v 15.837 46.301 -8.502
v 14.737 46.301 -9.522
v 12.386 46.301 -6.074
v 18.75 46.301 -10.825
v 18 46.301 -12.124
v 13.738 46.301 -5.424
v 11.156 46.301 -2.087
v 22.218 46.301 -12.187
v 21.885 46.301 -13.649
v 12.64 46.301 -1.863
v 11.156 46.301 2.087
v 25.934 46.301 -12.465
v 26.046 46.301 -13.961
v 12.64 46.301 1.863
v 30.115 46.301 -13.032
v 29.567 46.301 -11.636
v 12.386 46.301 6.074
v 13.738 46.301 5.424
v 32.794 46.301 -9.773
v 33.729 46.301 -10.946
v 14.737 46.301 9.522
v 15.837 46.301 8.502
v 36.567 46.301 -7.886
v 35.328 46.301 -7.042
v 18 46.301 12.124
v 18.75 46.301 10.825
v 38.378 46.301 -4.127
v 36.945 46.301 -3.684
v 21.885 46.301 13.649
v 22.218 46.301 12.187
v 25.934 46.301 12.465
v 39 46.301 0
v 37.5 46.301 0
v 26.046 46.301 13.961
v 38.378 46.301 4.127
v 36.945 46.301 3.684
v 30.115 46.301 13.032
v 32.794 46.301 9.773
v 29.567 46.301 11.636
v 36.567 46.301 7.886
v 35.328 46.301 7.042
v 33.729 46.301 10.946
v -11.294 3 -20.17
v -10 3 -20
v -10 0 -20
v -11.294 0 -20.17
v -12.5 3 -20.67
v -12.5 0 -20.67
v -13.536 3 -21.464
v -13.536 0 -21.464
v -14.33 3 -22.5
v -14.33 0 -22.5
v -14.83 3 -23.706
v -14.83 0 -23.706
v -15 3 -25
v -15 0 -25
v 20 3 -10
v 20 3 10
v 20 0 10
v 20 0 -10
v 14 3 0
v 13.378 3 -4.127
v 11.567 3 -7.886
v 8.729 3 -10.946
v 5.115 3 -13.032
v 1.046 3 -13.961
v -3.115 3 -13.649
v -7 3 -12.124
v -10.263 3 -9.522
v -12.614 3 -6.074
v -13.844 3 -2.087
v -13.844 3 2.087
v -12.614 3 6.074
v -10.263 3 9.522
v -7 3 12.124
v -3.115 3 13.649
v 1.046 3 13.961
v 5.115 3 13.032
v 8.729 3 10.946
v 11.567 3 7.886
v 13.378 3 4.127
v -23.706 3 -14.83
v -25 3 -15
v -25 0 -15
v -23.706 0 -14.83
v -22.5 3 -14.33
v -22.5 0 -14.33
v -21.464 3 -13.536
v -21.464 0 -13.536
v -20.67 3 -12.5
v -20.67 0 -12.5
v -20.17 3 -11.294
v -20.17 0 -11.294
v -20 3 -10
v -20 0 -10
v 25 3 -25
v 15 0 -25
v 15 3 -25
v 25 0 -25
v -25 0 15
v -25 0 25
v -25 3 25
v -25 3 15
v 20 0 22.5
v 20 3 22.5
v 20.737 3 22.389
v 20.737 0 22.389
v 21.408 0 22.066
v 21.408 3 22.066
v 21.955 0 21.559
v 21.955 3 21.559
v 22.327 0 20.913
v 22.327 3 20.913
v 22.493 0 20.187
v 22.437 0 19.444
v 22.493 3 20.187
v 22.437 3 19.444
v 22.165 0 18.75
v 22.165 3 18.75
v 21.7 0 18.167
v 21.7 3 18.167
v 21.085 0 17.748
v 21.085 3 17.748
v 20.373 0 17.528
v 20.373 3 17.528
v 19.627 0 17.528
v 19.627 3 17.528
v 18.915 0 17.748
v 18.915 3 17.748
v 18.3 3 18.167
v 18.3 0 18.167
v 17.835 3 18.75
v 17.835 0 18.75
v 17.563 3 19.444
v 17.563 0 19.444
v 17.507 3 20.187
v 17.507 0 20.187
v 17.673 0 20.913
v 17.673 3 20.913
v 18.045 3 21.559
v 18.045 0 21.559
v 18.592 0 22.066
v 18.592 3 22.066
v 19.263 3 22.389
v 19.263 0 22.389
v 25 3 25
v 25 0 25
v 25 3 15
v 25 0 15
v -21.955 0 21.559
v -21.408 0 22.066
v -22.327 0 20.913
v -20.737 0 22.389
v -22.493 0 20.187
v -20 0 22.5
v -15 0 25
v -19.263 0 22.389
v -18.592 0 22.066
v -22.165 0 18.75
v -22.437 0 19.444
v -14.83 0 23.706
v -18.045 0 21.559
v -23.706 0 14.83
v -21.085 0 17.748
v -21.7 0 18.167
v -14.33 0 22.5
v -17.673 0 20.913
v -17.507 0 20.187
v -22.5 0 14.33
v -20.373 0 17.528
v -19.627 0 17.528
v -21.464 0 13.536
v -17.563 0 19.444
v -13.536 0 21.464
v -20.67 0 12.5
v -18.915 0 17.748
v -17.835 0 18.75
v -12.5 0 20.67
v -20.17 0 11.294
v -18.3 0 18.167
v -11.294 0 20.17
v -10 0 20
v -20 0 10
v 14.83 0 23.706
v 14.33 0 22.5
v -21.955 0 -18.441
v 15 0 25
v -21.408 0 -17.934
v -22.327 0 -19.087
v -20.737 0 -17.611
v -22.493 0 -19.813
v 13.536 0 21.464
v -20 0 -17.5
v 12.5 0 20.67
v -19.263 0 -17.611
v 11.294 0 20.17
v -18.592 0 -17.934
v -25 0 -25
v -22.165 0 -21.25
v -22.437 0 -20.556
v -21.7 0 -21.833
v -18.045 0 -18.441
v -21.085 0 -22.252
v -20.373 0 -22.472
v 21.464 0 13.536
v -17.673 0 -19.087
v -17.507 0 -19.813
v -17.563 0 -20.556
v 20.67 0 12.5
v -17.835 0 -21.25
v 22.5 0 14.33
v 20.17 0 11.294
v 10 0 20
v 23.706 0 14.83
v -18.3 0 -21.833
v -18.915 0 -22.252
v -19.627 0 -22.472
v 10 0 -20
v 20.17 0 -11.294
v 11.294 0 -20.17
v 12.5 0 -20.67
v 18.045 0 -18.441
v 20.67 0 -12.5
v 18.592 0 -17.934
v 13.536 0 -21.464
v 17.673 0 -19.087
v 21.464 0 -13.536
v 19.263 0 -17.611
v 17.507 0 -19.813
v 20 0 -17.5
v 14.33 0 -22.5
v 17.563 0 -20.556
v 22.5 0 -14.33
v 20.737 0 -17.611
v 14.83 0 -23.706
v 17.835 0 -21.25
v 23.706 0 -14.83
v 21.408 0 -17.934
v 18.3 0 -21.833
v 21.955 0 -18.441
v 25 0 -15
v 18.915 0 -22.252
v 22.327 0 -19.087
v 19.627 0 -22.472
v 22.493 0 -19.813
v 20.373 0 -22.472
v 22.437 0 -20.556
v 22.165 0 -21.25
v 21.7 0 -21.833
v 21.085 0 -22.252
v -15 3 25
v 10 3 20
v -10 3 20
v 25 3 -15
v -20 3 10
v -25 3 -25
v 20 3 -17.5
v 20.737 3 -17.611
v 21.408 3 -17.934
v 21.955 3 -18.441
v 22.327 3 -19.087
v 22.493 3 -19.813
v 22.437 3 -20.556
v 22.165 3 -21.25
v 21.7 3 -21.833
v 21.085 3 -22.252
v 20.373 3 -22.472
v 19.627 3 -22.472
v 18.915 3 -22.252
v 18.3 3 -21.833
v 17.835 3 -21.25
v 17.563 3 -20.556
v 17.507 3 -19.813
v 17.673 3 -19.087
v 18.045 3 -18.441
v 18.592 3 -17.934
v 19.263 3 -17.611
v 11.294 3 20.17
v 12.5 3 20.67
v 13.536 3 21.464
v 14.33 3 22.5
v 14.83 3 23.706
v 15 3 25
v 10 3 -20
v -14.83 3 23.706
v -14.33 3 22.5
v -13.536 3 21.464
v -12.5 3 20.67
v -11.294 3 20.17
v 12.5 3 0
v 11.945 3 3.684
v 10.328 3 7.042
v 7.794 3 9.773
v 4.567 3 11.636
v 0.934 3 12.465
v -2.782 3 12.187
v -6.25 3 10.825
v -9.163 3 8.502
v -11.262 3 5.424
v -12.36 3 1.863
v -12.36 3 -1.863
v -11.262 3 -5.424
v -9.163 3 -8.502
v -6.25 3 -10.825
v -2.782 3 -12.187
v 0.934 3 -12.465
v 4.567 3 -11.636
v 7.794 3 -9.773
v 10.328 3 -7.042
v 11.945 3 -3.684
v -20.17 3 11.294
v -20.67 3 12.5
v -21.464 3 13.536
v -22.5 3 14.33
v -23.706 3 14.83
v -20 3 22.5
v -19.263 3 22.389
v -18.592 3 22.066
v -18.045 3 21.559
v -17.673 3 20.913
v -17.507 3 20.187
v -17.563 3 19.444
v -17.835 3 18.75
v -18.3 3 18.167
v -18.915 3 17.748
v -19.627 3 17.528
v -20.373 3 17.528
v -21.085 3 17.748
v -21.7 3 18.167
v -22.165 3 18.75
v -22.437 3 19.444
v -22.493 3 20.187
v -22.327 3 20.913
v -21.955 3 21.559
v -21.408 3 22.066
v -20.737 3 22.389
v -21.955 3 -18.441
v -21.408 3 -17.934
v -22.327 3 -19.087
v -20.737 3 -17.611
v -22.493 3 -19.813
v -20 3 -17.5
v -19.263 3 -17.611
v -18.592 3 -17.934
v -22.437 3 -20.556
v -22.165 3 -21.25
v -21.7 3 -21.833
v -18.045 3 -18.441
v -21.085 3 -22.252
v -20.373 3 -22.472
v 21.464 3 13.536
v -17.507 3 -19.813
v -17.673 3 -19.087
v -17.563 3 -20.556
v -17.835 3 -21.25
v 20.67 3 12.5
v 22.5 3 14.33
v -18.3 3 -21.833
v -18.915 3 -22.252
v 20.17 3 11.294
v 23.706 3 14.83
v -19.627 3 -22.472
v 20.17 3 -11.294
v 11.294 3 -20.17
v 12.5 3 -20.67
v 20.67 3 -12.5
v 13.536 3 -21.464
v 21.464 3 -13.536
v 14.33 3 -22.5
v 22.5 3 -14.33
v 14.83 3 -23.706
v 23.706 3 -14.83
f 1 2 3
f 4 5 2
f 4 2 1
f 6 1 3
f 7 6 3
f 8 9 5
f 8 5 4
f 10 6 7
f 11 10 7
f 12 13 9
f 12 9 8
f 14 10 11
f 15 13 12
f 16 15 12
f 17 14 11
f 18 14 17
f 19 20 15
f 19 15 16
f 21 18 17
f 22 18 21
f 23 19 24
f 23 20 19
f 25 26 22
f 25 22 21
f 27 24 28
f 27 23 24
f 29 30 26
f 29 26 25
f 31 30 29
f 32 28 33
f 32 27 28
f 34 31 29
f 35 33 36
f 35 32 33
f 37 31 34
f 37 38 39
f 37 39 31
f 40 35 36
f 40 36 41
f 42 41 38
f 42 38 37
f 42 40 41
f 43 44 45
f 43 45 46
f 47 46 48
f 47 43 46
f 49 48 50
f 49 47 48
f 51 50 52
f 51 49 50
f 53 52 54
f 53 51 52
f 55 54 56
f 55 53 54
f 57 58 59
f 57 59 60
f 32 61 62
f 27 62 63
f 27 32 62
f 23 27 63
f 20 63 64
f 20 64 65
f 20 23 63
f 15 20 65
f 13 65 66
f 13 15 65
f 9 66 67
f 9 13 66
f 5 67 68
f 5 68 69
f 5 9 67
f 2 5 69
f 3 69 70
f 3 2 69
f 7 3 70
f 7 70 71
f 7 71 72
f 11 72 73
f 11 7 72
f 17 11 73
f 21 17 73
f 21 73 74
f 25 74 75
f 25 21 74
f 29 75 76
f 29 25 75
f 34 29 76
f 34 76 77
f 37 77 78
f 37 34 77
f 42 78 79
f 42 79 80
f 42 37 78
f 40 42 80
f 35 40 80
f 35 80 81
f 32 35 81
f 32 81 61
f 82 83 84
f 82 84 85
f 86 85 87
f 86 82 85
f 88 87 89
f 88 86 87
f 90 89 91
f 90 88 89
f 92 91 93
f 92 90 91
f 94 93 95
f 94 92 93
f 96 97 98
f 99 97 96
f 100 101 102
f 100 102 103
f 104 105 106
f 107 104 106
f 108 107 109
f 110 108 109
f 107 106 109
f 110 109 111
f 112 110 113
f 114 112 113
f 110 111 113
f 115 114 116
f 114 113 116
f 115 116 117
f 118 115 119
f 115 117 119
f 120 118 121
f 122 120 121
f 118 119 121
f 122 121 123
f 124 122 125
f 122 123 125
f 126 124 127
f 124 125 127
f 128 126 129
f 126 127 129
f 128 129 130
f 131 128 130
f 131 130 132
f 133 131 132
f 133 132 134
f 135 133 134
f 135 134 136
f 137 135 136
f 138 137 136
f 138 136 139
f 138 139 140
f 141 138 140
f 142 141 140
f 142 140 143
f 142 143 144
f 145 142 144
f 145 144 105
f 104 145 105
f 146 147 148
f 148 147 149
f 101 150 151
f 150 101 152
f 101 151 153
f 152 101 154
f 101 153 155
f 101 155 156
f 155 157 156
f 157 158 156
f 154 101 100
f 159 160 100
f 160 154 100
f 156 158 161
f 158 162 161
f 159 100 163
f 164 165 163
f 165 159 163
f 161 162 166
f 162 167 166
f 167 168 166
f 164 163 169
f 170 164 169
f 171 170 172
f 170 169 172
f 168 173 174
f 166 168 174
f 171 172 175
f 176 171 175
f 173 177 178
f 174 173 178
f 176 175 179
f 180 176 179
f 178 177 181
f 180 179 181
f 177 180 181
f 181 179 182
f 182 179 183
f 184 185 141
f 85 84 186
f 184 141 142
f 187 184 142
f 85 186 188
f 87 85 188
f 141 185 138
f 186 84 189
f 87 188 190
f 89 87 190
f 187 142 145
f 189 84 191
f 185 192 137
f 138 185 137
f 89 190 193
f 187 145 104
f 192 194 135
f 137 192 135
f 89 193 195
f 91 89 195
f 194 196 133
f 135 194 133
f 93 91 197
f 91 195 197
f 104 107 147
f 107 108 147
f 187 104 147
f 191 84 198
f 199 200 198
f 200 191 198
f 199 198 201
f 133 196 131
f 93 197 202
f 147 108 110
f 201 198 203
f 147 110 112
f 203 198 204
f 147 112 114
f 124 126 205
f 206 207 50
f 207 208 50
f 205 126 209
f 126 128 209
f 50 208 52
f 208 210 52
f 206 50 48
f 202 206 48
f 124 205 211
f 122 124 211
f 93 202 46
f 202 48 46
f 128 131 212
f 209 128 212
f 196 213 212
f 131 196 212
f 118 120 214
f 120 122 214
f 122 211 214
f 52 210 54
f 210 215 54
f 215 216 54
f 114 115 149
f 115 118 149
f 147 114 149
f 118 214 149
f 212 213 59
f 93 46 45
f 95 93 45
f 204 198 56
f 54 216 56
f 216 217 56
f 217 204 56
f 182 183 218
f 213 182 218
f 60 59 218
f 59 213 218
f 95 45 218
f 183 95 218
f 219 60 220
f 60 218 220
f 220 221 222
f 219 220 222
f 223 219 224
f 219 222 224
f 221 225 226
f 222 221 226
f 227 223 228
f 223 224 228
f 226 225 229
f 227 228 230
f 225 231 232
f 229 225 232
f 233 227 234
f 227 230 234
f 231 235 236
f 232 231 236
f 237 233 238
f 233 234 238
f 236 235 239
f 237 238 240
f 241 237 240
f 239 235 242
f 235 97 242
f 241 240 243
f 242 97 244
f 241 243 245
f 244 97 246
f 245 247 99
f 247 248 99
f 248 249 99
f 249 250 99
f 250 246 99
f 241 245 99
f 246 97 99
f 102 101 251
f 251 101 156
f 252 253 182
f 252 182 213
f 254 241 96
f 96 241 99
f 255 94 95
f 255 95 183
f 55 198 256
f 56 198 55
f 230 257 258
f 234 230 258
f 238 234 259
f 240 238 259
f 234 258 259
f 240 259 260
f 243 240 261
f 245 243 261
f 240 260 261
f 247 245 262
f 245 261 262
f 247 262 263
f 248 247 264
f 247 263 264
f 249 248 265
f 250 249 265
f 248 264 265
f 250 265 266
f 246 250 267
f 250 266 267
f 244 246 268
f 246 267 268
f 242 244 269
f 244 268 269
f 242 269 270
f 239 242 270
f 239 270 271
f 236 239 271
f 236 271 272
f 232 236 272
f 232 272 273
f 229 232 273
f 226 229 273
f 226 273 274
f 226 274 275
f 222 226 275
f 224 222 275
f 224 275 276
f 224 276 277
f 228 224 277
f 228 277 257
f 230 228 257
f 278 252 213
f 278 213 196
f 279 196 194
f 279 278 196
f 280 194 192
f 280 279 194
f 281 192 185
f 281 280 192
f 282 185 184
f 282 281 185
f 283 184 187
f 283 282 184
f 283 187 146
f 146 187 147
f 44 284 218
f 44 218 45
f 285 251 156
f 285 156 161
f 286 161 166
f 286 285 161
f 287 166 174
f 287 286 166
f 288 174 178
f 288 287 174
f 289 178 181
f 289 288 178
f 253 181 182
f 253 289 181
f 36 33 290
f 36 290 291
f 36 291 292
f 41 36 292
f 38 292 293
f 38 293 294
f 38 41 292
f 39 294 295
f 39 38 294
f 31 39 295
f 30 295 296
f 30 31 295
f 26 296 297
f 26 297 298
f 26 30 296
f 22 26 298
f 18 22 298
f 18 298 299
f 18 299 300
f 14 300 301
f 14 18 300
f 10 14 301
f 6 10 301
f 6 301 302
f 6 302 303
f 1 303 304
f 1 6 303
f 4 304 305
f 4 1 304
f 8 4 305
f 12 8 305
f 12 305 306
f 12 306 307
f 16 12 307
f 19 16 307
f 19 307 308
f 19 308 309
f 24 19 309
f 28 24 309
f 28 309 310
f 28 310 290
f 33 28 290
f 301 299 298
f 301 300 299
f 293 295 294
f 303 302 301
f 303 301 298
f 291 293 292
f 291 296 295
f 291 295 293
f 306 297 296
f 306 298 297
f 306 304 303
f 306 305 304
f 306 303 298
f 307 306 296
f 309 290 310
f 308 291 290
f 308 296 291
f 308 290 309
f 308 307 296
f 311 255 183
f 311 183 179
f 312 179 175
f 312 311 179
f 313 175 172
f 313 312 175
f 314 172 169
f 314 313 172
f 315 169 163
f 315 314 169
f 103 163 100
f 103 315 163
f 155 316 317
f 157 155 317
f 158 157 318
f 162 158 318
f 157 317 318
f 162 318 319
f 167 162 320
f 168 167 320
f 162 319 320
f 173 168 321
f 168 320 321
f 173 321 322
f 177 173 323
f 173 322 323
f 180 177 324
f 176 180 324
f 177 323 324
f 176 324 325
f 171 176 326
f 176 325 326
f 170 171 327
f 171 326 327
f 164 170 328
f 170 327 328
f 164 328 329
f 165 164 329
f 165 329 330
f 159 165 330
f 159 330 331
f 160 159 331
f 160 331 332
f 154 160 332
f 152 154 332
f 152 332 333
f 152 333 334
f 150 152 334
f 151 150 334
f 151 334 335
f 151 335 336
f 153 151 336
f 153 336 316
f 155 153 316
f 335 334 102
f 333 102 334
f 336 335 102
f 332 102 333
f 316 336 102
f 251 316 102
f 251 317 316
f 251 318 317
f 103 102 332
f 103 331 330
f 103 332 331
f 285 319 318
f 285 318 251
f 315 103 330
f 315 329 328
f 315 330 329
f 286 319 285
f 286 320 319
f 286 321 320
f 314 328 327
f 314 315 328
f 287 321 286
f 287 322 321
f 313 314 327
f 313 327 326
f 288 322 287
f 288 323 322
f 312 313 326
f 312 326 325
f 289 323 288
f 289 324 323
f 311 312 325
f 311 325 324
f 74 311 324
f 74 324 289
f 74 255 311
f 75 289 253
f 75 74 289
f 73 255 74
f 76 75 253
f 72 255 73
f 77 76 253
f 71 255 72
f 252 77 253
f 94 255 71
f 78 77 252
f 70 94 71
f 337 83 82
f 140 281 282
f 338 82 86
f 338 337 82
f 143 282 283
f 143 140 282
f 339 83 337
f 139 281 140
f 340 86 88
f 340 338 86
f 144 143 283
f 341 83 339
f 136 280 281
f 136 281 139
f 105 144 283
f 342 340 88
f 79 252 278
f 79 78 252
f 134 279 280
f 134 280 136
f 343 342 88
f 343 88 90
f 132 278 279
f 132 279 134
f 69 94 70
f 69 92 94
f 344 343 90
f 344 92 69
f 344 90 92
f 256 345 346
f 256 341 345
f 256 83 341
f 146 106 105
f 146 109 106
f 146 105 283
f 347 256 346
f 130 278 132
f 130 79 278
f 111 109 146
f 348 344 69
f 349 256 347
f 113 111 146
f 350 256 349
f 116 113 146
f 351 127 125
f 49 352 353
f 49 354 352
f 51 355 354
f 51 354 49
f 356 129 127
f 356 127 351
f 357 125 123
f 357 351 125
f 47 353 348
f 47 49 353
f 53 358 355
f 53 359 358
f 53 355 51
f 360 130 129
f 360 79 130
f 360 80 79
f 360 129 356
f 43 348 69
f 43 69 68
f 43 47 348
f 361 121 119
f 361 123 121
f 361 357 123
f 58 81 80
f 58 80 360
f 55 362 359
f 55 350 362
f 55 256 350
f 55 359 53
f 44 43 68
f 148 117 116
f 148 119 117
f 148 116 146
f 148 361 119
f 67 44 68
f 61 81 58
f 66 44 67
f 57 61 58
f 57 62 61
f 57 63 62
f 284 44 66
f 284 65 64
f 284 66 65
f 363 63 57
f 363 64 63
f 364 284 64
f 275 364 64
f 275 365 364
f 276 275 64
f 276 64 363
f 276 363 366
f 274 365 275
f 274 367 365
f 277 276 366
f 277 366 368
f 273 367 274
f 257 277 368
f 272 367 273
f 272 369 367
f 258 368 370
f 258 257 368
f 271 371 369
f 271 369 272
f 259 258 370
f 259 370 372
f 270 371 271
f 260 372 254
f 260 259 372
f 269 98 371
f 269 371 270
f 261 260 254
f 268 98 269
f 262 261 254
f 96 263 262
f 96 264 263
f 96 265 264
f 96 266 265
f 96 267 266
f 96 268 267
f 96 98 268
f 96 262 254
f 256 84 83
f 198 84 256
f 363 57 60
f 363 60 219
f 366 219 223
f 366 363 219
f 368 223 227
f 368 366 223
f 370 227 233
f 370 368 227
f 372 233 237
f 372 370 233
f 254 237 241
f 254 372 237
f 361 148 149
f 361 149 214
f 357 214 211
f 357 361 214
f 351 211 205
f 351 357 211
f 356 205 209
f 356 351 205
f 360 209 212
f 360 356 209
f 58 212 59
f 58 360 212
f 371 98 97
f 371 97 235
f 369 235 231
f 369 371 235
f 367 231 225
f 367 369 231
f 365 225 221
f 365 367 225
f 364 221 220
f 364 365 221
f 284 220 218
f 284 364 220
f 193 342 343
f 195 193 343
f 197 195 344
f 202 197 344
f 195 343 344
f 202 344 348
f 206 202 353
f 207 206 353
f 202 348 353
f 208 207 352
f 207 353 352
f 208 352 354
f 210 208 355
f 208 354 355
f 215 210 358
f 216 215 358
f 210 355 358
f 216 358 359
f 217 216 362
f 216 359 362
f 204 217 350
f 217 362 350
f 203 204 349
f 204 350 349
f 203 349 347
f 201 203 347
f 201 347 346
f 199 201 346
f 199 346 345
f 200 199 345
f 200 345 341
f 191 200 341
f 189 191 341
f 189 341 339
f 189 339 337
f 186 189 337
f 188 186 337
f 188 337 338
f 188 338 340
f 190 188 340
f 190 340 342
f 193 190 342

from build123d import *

# Parameters (mm, degrees)
SKETCH1_W           = 50
SKETCH1_H           = 50
BOSS_EXTRUDE1_DEPTH = 3
SKETCH3_R           = 14
SKETCH3_R_2         = 12.5
CUT_EXTRUDE1_REACH  = 65.411
SKETCH4_R           = 2.5
CUT_EXTRUDE2_REACH  = 65.411
CIRPATTERN1_COUNT   = 4


with BuildPart() as part:
    # Sketch1 → Boss-Extrude1 (new body)
    with BuildSketch(Plane(origin=(0, 0, 0), x_dir=(1, 0, 0), z_dir=(0, 1, 0))):
        Rectangle(SKETCH1_W, SKETCH1_H)
    extrude(amount=BOSS_EXTRUDE1_DEPTH)

    # Sweep1: sweep along a path in Sketch2
    with BuildLine(Plane.XY) as sweep1_path:
        Line((0, 3), (25, 46.301270189))
    # Sketch3 → Sweep1 (sweep)
    with BuildSketch(Plane(origin=(0, 3, 0), x_dir=(1, 0, 0), z_dir=(0, 1, 0))):
        Circle(SKETCH3_R)
        Circle(SKETCH3_R_2, mode=Mode.SUBTRACT)
    sweep(path=sweep1_path.line)

    # Sketch4 → Cut-Extrude1 (cut, up to next)
    with BuildSketch(Plane(origin=(0, 3, 0), x_dir=(1, 0, 0), z_dir=(0, 1, 0)), mode=Mode.PRIVATE) as cut_extrude1_sk1:
        with Locations((-20, 20)):
            Circle(SKETCH4_R)
    cut_extrude1_tool1 = extrude(cut_extrude1_sk1.sketch, amount=-CUT_EXTRUDE1_REACH, mode=Mode.PRIVATE) & part.part
    # Sketch4 → Cut-Extrude1 (cut, up to next)
    with BuildSketch(Plane(origin=(0, 3, 0), x_dir=(1, 0, 0), z_dir=(0, 1, 0)), mode=Mode.PRIVATE) as cut_extrude1_sk2:
        with Locations((20, 20)):
            Circle(SKETCH4_R)
    cut_extrude1_tool2 = extrude(cut_extrude1_sk2.sketch, amount=-CUT_EXTRUDE1_REACH, mode=Mode.PRIVATE) & part.part
    # Sketch4 → Cut-Extrude1 (cut, up to next)
    with BuildSketch(Plane(origin=(0, 3, 0), x_dir=(1, 0, 0), z_dir=(0, 1, 0)), mode=Mode.PRIVATE) as cut_extrude1_sk3:
        with Locations((20, -20)):
            Circle(SKETCH4_R)
    cut_extrude1_tool3 = extrude(cut_extrude1_sk3.sketch, amount=-CUT_EXTRUDE1_REACH, mode=Mode.PRIVATE) & part.part
    # Sketch4 → Cut-Extrude1 (cut, up to next)
    with BuildSketch(Plane(origin=(0, 3, 0), x_dir=(1, 0, 0), z_dir=(0, 1, 0)), mode=Mode.PRIVATE) as cut_extrude1_sk4:
        with Locations((-20, -20)):
            Circle(SKETCH4_R)
    cut_extrude1_tool4 = extrude(cut_extrude1_sk4.sketch, amount=-CUT_EXTRUDE1_REACH, mode=Mode.PRIVATE) & part.part
    add(cut_extrude1_tool1.solids().sort_by_distance((-20, 3, -20))[0], mode=Mode.SUBTRACT)
    add(cut_extrude1_tool2.solids().sort_by_distance((20, 3, -20))[0], mode=Mode.SUBTRACT)
    add(cut_extrude1_tool3.solids().sort_by_distance((20, 3, 20))[0], mode=Mode.SUBTRACT)
    add(cut_extrude1_tool4.solids().sort_by_distance((-20, 3, 20))[0], mode=Mode.SUBTRACT)

    # Sketch5 → Cut-Extrude2 (cut, up to next)
    with BuildSketch(Plane(origin=(0, 3, 0), x_dir=(1, 0, 0), z_dir=(0, 1, 0)), mode=Mode.PRIVATE) as cut_extrude2_sk1:
        with BuildLine():
            Line((-10, 30), (10, 30))
            ThreePointArc((10, 30), (15, 25), (10, 20))
            Line((10, 20), (-10, 20))
            ThreePointArc((-10, 20), (-15, 25), (-10, 30))
        make_face()
    cut_extrude2_tool1 = extrude(cut_extrude2_sk1.sketch, amount=-CUT_EXTRUDE2_REACH, mode=Mode.PRIVATE) & part.part
    cut_extrude2 = cut_extrude2_tool1.solids().sort_by_distance((0, 3, -25))[0]
    add(cut_extrude2, mode=Mode.SUBTRACT)

    # CirPattern1: Cut-Extrude2 ×4 about axis
    cirpattern1_axis = Axis((0, 86.42986483, 0), (0, -1, 0))
    for i in range(1, CIRPATTERN1_COUNT):
        add(cut_extrude2.rotate(cirpattern1_axis, i * 360 / CIRPATTERN1_COUNT), mode=Mode.SUBTRACT)


solid = part.part
